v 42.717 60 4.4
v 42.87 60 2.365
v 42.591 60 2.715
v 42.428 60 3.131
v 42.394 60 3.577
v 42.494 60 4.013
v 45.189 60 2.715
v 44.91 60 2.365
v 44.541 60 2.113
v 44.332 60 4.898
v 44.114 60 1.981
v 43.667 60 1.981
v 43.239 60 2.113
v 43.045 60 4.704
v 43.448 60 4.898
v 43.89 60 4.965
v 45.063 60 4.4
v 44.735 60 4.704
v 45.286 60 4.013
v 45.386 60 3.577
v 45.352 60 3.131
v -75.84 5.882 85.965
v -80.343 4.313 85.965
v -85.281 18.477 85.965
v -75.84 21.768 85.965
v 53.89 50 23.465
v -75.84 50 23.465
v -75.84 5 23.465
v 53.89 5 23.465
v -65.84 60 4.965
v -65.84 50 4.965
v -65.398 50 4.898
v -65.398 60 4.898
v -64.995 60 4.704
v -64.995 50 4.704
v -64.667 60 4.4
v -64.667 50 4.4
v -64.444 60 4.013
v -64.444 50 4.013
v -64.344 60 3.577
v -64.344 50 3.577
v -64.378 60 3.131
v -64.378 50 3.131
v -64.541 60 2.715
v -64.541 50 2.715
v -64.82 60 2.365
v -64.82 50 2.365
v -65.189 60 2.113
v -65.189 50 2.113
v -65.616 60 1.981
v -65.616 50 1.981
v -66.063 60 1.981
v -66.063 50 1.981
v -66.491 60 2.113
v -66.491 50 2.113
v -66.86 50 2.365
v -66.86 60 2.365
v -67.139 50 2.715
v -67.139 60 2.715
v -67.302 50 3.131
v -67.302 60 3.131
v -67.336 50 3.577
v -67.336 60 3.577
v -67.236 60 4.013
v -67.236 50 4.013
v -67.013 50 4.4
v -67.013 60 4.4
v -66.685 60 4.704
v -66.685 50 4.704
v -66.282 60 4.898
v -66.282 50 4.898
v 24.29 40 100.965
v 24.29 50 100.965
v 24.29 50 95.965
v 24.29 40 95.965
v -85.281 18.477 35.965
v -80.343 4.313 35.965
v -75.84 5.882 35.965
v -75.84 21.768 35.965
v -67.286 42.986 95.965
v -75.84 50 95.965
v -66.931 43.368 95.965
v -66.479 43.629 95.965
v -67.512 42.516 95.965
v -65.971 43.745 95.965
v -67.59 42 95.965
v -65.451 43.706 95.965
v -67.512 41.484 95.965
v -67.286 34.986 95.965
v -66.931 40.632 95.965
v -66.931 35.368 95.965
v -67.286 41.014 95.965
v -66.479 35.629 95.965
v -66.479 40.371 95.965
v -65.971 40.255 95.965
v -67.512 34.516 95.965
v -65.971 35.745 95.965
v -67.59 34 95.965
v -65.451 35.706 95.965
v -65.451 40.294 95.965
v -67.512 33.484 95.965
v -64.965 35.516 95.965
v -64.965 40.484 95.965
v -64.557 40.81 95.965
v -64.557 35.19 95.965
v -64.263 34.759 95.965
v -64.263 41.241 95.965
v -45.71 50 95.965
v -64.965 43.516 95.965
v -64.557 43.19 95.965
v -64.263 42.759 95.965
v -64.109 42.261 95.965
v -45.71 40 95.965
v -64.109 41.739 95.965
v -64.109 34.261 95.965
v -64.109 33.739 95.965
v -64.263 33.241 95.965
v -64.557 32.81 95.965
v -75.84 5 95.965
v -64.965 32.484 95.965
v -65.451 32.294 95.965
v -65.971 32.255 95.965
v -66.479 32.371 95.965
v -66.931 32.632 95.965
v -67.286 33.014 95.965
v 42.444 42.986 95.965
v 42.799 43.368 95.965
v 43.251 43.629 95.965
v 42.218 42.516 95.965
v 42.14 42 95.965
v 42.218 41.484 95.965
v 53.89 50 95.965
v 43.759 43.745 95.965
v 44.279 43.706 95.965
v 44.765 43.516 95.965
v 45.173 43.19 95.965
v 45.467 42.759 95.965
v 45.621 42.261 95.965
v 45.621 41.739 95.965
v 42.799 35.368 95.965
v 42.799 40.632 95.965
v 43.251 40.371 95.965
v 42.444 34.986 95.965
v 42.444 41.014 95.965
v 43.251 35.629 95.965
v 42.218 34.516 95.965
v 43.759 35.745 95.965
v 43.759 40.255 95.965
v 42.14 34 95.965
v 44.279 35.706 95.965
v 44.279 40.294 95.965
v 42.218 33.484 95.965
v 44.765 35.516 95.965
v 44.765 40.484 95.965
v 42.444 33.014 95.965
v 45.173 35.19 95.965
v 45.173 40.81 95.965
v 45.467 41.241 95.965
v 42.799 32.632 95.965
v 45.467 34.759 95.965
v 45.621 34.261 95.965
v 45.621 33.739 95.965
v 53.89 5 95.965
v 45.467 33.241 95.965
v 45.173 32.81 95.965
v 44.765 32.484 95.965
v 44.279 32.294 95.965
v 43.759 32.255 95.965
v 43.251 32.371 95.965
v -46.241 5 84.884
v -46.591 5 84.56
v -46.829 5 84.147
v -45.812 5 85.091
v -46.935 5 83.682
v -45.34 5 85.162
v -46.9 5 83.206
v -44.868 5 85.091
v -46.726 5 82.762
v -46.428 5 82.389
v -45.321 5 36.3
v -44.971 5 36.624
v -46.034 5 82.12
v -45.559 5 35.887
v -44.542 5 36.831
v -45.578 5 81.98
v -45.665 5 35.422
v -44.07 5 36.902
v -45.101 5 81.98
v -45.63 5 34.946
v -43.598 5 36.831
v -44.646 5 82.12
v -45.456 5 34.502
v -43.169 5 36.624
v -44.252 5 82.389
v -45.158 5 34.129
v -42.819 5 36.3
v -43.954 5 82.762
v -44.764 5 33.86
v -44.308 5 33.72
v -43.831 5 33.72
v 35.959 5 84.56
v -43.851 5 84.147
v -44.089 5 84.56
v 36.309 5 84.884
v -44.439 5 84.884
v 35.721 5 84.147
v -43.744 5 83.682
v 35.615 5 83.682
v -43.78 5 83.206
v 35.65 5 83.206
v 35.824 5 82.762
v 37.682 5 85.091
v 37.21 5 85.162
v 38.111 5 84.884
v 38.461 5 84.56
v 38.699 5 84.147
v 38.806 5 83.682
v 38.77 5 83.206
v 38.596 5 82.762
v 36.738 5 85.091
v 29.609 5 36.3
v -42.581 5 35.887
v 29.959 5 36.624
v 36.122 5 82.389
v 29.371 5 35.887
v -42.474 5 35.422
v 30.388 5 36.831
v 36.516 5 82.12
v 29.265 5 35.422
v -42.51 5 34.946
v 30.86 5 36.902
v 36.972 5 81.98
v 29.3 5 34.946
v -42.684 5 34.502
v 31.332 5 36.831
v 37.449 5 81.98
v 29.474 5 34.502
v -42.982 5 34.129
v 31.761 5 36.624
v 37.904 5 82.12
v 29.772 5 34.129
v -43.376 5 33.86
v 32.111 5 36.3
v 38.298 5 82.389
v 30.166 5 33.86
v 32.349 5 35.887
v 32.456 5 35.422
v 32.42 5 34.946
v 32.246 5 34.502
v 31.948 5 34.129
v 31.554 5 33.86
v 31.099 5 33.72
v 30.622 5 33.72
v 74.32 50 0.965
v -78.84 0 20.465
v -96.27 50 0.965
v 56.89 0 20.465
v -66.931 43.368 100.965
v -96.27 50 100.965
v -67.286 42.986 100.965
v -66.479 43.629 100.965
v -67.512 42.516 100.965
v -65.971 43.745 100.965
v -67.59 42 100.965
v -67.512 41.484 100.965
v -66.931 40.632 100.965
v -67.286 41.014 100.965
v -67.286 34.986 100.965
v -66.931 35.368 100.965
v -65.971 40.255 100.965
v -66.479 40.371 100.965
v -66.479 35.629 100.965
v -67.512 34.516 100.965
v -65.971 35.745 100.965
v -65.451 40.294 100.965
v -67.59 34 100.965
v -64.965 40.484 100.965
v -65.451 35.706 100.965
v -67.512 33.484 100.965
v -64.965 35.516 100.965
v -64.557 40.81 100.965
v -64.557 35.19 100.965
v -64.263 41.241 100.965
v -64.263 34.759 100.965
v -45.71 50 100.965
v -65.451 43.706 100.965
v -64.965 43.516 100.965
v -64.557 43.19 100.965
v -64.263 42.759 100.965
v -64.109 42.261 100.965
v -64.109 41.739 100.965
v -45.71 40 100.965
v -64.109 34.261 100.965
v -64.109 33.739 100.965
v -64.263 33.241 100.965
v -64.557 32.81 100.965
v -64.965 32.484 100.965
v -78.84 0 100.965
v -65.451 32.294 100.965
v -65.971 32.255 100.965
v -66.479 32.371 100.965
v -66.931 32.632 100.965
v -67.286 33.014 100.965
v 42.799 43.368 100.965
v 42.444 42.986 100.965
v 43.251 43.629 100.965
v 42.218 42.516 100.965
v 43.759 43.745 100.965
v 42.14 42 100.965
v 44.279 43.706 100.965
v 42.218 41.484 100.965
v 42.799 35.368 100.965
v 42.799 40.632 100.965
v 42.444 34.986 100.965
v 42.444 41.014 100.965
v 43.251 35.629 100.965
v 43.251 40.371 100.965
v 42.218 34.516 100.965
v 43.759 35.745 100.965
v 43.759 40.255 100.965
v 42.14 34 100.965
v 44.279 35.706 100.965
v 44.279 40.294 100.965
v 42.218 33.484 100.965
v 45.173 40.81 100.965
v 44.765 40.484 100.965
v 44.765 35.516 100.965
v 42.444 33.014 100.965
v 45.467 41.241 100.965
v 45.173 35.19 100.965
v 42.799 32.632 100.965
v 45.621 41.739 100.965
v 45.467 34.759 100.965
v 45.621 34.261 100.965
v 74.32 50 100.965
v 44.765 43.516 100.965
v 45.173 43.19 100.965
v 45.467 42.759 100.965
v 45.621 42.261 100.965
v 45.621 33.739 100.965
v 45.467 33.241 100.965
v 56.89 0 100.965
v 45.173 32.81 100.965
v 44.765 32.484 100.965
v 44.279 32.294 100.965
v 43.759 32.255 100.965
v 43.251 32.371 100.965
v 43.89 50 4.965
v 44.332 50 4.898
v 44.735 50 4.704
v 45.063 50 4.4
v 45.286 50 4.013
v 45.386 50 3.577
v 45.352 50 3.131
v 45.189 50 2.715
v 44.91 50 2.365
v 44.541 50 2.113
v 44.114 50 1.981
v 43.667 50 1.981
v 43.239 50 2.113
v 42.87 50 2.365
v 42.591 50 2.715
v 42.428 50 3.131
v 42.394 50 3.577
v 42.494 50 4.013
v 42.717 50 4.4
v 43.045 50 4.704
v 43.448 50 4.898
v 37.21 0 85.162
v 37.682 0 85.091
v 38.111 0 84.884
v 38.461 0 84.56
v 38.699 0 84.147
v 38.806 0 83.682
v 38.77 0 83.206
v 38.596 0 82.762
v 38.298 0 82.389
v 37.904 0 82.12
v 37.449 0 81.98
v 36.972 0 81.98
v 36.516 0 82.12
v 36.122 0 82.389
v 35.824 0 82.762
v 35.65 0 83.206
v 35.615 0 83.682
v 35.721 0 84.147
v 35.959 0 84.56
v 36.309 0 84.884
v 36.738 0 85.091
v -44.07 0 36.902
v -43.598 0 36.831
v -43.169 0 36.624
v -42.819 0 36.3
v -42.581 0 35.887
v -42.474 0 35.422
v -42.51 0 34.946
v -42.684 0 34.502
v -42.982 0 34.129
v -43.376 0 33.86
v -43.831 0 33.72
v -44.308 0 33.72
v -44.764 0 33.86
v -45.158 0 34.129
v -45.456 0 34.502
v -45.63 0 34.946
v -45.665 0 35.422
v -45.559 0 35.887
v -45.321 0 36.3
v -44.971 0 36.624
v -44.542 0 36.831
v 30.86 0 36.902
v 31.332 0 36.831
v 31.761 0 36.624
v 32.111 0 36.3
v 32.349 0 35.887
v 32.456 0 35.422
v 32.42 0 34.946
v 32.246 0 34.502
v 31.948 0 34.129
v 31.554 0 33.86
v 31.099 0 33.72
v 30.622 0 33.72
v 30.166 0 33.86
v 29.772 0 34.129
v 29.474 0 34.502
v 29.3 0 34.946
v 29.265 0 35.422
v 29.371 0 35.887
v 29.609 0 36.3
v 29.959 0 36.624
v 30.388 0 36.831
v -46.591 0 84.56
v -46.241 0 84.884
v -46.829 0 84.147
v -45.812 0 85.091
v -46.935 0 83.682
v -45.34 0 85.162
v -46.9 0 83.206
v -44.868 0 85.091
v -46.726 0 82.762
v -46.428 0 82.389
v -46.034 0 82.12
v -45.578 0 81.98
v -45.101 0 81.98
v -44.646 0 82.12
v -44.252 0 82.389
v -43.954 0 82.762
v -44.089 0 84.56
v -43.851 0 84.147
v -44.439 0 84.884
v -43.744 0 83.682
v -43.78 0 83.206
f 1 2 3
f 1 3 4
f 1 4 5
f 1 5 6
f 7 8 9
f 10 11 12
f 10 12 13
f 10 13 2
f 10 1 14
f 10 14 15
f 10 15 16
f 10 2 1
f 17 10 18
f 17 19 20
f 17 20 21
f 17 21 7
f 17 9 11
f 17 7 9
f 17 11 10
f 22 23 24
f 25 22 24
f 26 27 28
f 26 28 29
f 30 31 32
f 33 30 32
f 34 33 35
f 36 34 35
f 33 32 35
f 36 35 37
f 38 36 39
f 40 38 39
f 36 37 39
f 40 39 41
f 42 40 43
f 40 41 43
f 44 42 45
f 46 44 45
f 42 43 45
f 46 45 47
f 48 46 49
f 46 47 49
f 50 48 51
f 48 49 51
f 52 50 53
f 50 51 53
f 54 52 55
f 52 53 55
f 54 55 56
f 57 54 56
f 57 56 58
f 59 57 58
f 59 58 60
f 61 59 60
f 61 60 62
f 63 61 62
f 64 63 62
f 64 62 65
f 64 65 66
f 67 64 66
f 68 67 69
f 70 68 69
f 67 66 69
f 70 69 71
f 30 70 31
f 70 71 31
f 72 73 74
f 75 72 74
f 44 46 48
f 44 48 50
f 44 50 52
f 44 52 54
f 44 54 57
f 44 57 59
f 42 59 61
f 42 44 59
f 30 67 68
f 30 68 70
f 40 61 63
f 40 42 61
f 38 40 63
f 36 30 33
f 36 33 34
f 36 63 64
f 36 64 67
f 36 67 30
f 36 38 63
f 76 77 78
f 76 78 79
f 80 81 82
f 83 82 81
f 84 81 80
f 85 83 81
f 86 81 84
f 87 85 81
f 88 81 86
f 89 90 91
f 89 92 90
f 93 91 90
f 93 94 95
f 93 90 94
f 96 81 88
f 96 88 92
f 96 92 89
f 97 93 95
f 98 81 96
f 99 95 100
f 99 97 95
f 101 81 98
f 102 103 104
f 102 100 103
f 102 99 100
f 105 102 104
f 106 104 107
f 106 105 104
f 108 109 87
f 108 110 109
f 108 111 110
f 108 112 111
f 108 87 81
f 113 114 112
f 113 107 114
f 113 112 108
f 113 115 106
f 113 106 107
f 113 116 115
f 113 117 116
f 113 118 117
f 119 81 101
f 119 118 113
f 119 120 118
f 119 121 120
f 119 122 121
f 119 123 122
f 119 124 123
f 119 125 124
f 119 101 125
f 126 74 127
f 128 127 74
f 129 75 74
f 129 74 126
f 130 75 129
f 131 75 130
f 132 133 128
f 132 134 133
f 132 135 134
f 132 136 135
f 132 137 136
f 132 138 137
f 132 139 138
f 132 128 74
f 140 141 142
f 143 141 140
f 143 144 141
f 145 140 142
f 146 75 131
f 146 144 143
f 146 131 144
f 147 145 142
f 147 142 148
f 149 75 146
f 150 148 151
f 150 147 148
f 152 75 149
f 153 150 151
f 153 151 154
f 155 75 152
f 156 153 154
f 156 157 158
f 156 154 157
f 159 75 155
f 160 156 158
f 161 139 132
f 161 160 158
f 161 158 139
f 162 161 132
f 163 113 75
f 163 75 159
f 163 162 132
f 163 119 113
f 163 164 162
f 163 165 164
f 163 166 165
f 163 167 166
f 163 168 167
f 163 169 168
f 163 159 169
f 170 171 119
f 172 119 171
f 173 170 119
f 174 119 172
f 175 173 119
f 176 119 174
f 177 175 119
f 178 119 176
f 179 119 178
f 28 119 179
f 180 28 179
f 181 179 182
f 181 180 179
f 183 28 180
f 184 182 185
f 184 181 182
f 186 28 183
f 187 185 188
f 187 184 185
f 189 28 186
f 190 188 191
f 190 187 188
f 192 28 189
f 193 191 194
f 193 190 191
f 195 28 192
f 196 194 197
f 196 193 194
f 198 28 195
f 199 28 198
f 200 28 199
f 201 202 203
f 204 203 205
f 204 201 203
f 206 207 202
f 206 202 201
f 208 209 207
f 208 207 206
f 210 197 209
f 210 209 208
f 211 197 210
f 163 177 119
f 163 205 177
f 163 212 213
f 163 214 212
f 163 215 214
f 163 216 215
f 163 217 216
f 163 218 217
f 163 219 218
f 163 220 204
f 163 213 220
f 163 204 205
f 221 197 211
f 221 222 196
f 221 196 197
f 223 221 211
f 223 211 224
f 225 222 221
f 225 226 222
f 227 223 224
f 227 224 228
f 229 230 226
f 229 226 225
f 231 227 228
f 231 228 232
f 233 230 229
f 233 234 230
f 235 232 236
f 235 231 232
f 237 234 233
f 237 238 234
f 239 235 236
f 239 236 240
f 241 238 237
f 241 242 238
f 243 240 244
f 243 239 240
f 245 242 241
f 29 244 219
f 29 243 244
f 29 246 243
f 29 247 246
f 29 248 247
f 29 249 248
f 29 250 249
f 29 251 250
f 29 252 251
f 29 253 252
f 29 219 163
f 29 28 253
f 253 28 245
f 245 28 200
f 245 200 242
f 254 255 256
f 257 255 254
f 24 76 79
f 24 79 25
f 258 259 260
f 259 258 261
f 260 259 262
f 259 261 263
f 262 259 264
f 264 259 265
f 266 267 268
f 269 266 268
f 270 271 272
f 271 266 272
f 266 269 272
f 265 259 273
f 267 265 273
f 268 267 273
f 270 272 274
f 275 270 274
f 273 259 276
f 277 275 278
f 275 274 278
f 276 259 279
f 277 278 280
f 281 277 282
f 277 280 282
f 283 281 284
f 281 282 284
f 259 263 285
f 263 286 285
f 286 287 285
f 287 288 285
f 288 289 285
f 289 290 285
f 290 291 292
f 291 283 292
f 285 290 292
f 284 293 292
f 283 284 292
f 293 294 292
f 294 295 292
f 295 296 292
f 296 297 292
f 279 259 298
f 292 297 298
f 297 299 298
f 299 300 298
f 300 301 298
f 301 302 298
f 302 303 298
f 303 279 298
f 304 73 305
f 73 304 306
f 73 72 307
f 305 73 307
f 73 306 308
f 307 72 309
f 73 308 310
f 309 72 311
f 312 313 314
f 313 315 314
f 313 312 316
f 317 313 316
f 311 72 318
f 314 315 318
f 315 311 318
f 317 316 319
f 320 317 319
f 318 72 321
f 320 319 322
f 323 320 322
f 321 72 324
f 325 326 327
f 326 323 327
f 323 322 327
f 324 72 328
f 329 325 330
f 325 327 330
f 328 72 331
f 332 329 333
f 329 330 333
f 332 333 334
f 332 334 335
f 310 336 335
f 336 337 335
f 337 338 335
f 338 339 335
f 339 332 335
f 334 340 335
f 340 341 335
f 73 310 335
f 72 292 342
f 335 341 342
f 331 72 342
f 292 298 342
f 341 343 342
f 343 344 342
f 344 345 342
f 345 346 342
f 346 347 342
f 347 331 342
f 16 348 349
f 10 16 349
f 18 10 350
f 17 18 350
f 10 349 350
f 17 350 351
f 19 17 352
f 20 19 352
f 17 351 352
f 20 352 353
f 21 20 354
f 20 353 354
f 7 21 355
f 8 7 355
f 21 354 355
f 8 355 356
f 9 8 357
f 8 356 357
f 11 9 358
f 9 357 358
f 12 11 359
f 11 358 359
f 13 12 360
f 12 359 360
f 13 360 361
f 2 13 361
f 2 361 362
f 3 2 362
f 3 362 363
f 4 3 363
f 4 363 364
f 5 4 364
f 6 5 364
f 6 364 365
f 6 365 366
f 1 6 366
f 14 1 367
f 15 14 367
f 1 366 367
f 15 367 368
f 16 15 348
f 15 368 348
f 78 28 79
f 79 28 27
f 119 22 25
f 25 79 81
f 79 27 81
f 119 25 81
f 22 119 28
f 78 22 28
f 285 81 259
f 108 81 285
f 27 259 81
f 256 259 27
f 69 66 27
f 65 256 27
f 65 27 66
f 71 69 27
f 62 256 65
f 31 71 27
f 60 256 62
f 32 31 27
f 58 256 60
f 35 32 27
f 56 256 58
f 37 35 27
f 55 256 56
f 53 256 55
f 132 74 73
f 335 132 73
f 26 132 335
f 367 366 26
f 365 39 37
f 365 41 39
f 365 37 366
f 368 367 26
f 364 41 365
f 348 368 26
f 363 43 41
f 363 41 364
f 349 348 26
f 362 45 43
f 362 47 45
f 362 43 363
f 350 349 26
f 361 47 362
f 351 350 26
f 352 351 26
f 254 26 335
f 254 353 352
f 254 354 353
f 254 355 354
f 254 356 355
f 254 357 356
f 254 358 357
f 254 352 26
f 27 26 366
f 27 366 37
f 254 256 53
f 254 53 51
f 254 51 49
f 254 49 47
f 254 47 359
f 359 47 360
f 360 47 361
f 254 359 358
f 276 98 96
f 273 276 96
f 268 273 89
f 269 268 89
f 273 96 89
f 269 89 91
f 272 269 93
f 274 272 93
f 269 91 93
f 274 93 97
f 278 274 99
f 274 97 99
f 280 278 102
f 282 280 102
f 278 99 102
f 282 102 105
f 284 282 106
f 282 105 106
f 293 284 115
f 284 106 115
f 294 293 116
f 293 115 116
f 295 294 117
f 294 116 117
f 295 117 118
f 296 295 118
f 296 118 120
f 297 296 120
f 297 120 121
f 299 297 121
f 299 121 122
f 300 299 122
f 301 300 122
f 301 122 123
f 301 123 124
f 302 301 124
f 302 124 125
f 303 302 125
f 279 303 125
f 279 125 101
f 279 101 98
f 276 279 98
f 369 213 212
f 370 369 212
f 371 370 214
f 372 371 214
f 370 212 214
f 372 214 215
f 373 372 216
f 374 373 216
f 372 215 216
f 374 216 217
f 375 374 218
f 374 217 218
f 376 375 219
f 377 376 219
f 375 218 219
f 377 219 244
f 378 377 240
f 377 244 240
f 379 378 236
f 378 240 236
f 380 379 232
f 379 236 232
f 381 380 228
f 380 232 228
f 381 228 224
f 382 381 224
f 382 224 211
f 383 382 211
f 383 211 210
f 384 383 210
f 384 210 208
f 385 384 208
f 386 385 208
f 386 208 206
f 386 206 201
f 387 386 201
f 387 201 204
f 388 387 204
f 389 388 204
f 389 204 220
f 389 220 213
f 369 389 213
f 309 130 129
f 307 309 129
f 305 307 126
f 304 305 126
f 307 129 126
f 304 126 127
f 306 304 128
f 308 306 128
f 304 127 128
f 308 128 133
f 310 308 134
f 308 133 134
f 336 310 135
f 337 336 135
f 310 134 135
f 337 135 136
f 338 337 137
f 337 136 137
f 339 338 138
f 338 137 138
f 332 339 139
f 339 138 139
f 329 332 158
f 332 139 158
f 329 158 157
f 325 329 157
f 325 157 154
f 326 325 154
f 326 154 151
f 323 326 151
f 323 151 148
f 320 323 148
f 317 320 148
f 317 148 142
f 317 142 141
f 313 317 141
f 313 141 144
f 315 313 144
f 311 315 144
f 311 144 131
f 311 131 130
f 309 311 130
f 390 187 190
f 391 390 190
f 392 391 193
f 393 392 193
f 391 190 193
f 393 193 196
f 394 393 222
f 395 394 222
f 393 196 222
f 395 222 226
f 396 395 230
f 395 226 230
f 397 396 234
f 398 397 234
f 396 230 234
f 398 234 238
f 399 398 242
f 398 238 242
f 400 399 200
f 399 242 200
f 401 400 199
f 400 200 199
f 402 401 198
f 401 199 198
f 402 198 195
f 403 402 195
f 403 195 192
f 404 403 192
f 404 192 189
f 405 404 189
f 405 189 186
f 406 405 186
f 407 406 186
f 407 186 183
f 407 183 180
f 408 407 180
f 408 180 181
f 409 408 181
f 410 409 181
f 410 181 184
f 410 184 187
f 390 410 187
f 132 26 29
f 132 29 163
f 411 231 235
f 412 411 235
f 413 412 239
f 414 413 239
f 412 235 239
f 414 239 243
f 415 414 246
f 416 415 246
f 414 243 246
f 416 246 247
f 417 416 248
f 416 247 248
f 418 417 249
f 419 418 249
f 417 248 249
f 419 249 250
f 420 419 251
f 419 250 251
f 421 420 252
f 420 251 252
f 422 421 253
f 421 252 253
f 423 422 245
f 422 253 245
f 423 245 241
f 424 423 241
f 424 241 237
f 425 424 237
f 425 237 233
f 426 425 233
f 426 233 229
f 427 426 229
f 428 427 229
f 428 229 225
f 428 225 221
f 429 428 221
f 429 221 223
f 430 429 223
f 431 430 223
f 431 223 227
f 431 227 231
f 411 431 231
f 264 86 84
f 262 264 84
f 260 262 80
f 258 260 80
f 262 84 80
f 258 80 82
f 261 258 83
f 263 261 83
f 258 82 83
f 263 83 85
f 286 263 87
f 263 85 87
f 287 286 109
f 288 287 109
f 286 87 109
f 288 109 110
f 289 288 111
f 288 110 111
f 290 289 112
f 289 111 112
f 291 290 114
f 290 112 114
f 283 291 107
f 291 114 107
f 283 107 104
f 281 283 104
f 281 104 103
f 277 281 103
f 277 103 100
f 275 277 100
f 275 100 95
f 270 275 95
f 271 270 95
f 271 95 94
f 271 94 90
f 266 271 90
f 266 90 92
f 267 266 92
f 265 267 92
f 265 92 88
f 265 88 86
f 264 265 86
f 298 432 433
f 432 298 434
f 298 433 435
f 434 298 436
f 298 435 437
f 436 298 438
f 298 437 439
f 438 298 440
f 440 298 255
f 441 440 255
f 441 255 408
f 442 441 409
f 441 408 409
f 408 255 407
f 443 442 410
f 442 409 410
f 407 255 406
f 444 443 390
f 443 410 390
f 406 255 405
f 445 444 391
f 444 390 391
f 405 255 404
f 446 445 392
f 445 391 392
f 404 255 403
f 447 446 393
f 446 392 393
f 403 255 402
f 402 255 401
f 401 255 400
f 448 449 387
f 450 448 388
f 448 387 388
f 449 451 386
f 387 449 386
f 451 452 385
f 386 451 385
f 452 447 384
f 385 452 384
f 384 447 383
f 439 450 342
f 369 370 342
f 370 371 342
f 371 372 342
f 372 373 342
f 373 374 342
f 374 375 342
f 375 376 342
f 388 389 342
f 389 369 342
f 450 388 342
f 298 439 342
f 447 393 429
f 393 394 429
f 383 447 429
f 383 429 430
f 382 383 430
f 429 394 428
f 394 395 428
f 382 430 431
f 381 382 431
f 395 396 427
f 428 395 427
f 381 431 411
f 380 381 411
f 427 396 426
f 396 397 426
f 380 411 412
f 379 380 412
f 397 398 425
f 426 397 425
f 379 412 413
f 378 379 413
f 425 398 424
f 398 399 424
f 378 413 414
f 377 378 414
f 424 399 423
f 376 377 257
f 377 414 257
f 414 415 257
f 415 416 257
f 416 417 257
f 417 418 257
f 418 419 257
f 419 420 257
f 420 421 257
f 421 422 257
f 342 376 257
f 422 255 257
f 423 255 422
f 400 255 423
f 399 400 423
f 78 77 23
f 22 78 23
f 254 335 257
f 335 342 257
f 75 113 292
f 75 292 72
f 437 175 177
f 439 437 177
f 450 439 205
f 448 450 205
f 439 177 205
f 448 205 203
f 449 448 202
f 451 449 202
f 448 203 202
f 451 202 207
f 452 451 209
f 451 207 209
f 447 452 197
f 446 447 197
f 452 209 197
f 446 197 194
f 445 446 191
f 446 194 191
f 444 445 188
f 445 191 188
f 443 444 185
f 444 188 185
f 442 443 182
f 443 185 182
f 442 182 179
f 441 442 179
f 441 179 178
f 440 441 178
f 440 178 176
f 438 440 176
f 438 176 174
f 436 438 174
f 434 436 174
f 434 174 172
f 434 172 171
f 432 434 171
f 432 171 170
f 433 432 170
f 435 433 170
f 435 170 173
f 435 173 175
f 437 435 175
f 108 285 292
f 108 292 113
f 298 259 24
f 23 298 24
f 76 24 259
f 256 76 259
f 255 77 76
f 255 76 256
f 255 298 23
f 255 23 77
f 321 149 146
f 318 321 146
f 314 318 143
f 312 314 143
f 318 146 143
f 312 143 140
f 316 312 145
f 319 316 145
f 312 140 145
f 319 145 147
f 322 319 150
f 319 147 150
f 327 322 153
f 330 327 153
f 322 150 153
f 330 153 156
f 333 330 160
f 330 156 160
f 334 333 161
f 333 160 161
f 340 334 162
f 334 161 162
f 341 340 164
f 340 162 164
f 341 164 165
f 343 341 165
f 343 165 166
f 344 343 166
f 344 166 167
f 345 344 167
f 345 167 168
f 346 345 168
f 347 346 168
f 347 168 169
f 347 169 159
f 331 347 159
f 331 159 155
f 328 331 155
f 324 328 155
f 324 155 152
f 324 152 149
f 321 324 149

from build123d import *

# Parameters (mm, degrees)
SKETCH3_W           = 135.73
SKETCH3_H           = 80.5
BOSS_EXTRUDE1_DEPTH = 5
SKETCH4_W           = 135.73
SKETCH4_H           = 80.5
SKETCH4_W_2         = 125.73
SKETCH4_H_2         = 70.5
BOSS_EXTRUDE2_DEPTH = 45
SKETCH8_W           = 70
SKETCH8_H           = 5
CUT_EXTRUDE2_DEPTH  = 10
DRAFT3_ANGLE        = 21.30578
DRAFT4_ANGLE        = 19.21855
SKETCH12_R          = 1.75
CUT_EXTRUDE3_DEPTH  = 10
CUT_EXTRUDE4_DEPTH  = 45
SKETCH19_R          = 1.6
CUT_EXTRUDE5_DEPTH  = 10
SKETCH20_W          = 50
SKETCH20_H          = 15
CUT_EXTRUDE6_DEPTH  = 15
SKETCH21_R          = 1.5
BOSS_EXTRUDE3_DEPTH = 10


with BuildPart() as part:
    # Sketch3 → Boss-Extrude1 (new body)
    with BuildSketch(Plane(origin=(0, 0, 0), x_dir=(1, 0, 0), z_dir=(0, 1, 0))):
        with Locations((-10.97491424, -60.714595487)):
            Rectangle(SKETCH3_W, SKETCH3_H)
    extrude(amount=BOSS_EXTRUDE1_DEPTH)

    # Sketch4 → Boss-Extrude2 (add)
    with BuildSketch(Plane(origin=(0, 5, 0), x_dir=(1, 0, 0), z_dir=(0, 1, 0))):
        with Locations((-10.97491424, -60.714595487)):
            Rectangle(SKETCH4_W, SKETCH4_H)
        with Locations((-10.97491424, -60.714595487)):
            Rectangle(SKETCH4_W_2, SKETCH4_H_2, mode=Mode.SUBTRACT)
    extrude(amount=BOSS_EXTRUDE2_DEPTH)

    # Sketch8 → Cut-Extrude2 (cut)
    with BuildSketch(Plane(origin=(0, 50, 0), x_dir=(1, 0, 0), z_dir=(0, 1, 0))):
        with Locations((-10.70991424, -98.464595487)):
            Rectangle(SKETCH8_W, SKETCH8_H)
    extrude(amount=-CUT_EXTRUDE2_DEPTH, mode=Mode.SUBTRACT)

    # Draft3
    draft3_faces = [part.faces().sort_by_distance(p)[0] for p in [
        (-10.97491424, 25, 20.464595487),
    ]]
    draft(draft3_faces, Plane(origin=(0, 0, 0), x_dir=(0, 0, -1), z_dir=(0, -1, 0)), DRAFT3_ANGLE)

    # Draft4
    draft4_faces = [part.faces().sort_by_distance(p)[0] for p in [
        (-78.83991424, 25.900276859, 55.664042442),
        (56.89008576, 25.900276859, 55.664042442),
    ]]
    draft(draft4_faces, Plane(origin=(0, 0, 0), x_dir=(0, 0, -1), z_dir=(0, -1, 0)), DRAFT4_ANGLE)

    # Sketch12 → Cut-Extrude3 (cut)
    with BuildSketch(Plane(origin=(0, 0, 95.964595487), x_dir=(-1, 0, 0), z_dir=(0, 0, -1))):
        with Locations((65.83991424, 42)):
            Circle(SKETCH12_R)
        with Locations((65.83991424, 34)):
            Circle(SKETCH12_R)
        with Locations((-43.89008576, 42)):
            Circle(SKETCH12_R)
        with Locations((-43.89008576, 34)):
            Circle(SKETCH12_R)
    extrude(amount=-CUT_EXTRUDE3_DEPTH, mode=Mode.SUBTRACT)

    # Sketch15 → Cut-Extrude4 (cut)
    with BuildSketch(Plane(origin=(0, 50, 0), x_dir=(1, 0, 0), z_dir=(0, 1, 0))):
        Polygon((-73.83991424, -95.964595487), (-75.83991424, -95.964595487), (-75.83991424, -50.577012028), (-75.83991424, -23.464595487), (53.89008576, -23.464595487), (53.89008576, -95.964595487), (51.89008576, -95.964595487), (51.89008576, -25.464595487), (-73.83991424, -25.464595487), align=None)
    extrude(amount=-CUT_EXTRUDE4_DEPTH, mode=Mode.SUBTRACT)

    # Sketch19 → Cut-Extrude5 (cut)
    with BuildSketch(Plane(origin=(0, 5, 0), x_dir=(1, 0, 0), z_dir=(0, 1, 0))):
        with Locations(Location((-45.339914237, -83.561998038, 0), (0, 0, 270))):
            Circle(SKETCH19_R)
        with Locations(Location((-44.06991424, -35.301998038, 0), (0, 0, 270))):
            Circle(SKETCH19_R)
        with Locations(Location((30.86008576, -35.301998033, 0), (0, 0, 270))):
            Circle(SKETCH19_R)
        with Locations(Location((37.210085763, -83.561998033, 0), (0, 0, 270))):
            Circle(SKETCH19_R)
    extrude(amount=-CUT_EXTRUDE5_DEPTH, mode=Mode.SUBTRACT)

    # Sketch20 → Cut-Extrude6 (cut)
    with BuildSketch(Plane(origin=(-70.297258269, -24.505617582, 0), x_dir=(0, 0, 1), z_dir=(-0.9442698473474347, -0.3291723794464724, 0))):
        with Locations((60.964595487, 38.019061203)):
            Rectangle(SKETCH20_W, SKETCH20_H)
    extrude(amount=-CUT_EXTRUDE6_DEPTH, mode=Mode.SUBTRACT)

    # Sketch21 → Boss-Extrude3 (add)
    with BuildSketch(Plane(origin=(0, 50, 0), x_dir=(1, 0, 0), z_dir=(0, 1, 0))):
        with Locations(Location((-65.839914241, -3.464599124, 0), (0, 0, 270))):
            Circle(SKETCH21_R)
        with Locations(Location((43.890085759, -3.464599124, 0), (0, 0, 270))):
            Circle(SKETCH21_R)
    extrude(amount=BOSS_EXTRUDE3_DEPTH)


solid = part.part
